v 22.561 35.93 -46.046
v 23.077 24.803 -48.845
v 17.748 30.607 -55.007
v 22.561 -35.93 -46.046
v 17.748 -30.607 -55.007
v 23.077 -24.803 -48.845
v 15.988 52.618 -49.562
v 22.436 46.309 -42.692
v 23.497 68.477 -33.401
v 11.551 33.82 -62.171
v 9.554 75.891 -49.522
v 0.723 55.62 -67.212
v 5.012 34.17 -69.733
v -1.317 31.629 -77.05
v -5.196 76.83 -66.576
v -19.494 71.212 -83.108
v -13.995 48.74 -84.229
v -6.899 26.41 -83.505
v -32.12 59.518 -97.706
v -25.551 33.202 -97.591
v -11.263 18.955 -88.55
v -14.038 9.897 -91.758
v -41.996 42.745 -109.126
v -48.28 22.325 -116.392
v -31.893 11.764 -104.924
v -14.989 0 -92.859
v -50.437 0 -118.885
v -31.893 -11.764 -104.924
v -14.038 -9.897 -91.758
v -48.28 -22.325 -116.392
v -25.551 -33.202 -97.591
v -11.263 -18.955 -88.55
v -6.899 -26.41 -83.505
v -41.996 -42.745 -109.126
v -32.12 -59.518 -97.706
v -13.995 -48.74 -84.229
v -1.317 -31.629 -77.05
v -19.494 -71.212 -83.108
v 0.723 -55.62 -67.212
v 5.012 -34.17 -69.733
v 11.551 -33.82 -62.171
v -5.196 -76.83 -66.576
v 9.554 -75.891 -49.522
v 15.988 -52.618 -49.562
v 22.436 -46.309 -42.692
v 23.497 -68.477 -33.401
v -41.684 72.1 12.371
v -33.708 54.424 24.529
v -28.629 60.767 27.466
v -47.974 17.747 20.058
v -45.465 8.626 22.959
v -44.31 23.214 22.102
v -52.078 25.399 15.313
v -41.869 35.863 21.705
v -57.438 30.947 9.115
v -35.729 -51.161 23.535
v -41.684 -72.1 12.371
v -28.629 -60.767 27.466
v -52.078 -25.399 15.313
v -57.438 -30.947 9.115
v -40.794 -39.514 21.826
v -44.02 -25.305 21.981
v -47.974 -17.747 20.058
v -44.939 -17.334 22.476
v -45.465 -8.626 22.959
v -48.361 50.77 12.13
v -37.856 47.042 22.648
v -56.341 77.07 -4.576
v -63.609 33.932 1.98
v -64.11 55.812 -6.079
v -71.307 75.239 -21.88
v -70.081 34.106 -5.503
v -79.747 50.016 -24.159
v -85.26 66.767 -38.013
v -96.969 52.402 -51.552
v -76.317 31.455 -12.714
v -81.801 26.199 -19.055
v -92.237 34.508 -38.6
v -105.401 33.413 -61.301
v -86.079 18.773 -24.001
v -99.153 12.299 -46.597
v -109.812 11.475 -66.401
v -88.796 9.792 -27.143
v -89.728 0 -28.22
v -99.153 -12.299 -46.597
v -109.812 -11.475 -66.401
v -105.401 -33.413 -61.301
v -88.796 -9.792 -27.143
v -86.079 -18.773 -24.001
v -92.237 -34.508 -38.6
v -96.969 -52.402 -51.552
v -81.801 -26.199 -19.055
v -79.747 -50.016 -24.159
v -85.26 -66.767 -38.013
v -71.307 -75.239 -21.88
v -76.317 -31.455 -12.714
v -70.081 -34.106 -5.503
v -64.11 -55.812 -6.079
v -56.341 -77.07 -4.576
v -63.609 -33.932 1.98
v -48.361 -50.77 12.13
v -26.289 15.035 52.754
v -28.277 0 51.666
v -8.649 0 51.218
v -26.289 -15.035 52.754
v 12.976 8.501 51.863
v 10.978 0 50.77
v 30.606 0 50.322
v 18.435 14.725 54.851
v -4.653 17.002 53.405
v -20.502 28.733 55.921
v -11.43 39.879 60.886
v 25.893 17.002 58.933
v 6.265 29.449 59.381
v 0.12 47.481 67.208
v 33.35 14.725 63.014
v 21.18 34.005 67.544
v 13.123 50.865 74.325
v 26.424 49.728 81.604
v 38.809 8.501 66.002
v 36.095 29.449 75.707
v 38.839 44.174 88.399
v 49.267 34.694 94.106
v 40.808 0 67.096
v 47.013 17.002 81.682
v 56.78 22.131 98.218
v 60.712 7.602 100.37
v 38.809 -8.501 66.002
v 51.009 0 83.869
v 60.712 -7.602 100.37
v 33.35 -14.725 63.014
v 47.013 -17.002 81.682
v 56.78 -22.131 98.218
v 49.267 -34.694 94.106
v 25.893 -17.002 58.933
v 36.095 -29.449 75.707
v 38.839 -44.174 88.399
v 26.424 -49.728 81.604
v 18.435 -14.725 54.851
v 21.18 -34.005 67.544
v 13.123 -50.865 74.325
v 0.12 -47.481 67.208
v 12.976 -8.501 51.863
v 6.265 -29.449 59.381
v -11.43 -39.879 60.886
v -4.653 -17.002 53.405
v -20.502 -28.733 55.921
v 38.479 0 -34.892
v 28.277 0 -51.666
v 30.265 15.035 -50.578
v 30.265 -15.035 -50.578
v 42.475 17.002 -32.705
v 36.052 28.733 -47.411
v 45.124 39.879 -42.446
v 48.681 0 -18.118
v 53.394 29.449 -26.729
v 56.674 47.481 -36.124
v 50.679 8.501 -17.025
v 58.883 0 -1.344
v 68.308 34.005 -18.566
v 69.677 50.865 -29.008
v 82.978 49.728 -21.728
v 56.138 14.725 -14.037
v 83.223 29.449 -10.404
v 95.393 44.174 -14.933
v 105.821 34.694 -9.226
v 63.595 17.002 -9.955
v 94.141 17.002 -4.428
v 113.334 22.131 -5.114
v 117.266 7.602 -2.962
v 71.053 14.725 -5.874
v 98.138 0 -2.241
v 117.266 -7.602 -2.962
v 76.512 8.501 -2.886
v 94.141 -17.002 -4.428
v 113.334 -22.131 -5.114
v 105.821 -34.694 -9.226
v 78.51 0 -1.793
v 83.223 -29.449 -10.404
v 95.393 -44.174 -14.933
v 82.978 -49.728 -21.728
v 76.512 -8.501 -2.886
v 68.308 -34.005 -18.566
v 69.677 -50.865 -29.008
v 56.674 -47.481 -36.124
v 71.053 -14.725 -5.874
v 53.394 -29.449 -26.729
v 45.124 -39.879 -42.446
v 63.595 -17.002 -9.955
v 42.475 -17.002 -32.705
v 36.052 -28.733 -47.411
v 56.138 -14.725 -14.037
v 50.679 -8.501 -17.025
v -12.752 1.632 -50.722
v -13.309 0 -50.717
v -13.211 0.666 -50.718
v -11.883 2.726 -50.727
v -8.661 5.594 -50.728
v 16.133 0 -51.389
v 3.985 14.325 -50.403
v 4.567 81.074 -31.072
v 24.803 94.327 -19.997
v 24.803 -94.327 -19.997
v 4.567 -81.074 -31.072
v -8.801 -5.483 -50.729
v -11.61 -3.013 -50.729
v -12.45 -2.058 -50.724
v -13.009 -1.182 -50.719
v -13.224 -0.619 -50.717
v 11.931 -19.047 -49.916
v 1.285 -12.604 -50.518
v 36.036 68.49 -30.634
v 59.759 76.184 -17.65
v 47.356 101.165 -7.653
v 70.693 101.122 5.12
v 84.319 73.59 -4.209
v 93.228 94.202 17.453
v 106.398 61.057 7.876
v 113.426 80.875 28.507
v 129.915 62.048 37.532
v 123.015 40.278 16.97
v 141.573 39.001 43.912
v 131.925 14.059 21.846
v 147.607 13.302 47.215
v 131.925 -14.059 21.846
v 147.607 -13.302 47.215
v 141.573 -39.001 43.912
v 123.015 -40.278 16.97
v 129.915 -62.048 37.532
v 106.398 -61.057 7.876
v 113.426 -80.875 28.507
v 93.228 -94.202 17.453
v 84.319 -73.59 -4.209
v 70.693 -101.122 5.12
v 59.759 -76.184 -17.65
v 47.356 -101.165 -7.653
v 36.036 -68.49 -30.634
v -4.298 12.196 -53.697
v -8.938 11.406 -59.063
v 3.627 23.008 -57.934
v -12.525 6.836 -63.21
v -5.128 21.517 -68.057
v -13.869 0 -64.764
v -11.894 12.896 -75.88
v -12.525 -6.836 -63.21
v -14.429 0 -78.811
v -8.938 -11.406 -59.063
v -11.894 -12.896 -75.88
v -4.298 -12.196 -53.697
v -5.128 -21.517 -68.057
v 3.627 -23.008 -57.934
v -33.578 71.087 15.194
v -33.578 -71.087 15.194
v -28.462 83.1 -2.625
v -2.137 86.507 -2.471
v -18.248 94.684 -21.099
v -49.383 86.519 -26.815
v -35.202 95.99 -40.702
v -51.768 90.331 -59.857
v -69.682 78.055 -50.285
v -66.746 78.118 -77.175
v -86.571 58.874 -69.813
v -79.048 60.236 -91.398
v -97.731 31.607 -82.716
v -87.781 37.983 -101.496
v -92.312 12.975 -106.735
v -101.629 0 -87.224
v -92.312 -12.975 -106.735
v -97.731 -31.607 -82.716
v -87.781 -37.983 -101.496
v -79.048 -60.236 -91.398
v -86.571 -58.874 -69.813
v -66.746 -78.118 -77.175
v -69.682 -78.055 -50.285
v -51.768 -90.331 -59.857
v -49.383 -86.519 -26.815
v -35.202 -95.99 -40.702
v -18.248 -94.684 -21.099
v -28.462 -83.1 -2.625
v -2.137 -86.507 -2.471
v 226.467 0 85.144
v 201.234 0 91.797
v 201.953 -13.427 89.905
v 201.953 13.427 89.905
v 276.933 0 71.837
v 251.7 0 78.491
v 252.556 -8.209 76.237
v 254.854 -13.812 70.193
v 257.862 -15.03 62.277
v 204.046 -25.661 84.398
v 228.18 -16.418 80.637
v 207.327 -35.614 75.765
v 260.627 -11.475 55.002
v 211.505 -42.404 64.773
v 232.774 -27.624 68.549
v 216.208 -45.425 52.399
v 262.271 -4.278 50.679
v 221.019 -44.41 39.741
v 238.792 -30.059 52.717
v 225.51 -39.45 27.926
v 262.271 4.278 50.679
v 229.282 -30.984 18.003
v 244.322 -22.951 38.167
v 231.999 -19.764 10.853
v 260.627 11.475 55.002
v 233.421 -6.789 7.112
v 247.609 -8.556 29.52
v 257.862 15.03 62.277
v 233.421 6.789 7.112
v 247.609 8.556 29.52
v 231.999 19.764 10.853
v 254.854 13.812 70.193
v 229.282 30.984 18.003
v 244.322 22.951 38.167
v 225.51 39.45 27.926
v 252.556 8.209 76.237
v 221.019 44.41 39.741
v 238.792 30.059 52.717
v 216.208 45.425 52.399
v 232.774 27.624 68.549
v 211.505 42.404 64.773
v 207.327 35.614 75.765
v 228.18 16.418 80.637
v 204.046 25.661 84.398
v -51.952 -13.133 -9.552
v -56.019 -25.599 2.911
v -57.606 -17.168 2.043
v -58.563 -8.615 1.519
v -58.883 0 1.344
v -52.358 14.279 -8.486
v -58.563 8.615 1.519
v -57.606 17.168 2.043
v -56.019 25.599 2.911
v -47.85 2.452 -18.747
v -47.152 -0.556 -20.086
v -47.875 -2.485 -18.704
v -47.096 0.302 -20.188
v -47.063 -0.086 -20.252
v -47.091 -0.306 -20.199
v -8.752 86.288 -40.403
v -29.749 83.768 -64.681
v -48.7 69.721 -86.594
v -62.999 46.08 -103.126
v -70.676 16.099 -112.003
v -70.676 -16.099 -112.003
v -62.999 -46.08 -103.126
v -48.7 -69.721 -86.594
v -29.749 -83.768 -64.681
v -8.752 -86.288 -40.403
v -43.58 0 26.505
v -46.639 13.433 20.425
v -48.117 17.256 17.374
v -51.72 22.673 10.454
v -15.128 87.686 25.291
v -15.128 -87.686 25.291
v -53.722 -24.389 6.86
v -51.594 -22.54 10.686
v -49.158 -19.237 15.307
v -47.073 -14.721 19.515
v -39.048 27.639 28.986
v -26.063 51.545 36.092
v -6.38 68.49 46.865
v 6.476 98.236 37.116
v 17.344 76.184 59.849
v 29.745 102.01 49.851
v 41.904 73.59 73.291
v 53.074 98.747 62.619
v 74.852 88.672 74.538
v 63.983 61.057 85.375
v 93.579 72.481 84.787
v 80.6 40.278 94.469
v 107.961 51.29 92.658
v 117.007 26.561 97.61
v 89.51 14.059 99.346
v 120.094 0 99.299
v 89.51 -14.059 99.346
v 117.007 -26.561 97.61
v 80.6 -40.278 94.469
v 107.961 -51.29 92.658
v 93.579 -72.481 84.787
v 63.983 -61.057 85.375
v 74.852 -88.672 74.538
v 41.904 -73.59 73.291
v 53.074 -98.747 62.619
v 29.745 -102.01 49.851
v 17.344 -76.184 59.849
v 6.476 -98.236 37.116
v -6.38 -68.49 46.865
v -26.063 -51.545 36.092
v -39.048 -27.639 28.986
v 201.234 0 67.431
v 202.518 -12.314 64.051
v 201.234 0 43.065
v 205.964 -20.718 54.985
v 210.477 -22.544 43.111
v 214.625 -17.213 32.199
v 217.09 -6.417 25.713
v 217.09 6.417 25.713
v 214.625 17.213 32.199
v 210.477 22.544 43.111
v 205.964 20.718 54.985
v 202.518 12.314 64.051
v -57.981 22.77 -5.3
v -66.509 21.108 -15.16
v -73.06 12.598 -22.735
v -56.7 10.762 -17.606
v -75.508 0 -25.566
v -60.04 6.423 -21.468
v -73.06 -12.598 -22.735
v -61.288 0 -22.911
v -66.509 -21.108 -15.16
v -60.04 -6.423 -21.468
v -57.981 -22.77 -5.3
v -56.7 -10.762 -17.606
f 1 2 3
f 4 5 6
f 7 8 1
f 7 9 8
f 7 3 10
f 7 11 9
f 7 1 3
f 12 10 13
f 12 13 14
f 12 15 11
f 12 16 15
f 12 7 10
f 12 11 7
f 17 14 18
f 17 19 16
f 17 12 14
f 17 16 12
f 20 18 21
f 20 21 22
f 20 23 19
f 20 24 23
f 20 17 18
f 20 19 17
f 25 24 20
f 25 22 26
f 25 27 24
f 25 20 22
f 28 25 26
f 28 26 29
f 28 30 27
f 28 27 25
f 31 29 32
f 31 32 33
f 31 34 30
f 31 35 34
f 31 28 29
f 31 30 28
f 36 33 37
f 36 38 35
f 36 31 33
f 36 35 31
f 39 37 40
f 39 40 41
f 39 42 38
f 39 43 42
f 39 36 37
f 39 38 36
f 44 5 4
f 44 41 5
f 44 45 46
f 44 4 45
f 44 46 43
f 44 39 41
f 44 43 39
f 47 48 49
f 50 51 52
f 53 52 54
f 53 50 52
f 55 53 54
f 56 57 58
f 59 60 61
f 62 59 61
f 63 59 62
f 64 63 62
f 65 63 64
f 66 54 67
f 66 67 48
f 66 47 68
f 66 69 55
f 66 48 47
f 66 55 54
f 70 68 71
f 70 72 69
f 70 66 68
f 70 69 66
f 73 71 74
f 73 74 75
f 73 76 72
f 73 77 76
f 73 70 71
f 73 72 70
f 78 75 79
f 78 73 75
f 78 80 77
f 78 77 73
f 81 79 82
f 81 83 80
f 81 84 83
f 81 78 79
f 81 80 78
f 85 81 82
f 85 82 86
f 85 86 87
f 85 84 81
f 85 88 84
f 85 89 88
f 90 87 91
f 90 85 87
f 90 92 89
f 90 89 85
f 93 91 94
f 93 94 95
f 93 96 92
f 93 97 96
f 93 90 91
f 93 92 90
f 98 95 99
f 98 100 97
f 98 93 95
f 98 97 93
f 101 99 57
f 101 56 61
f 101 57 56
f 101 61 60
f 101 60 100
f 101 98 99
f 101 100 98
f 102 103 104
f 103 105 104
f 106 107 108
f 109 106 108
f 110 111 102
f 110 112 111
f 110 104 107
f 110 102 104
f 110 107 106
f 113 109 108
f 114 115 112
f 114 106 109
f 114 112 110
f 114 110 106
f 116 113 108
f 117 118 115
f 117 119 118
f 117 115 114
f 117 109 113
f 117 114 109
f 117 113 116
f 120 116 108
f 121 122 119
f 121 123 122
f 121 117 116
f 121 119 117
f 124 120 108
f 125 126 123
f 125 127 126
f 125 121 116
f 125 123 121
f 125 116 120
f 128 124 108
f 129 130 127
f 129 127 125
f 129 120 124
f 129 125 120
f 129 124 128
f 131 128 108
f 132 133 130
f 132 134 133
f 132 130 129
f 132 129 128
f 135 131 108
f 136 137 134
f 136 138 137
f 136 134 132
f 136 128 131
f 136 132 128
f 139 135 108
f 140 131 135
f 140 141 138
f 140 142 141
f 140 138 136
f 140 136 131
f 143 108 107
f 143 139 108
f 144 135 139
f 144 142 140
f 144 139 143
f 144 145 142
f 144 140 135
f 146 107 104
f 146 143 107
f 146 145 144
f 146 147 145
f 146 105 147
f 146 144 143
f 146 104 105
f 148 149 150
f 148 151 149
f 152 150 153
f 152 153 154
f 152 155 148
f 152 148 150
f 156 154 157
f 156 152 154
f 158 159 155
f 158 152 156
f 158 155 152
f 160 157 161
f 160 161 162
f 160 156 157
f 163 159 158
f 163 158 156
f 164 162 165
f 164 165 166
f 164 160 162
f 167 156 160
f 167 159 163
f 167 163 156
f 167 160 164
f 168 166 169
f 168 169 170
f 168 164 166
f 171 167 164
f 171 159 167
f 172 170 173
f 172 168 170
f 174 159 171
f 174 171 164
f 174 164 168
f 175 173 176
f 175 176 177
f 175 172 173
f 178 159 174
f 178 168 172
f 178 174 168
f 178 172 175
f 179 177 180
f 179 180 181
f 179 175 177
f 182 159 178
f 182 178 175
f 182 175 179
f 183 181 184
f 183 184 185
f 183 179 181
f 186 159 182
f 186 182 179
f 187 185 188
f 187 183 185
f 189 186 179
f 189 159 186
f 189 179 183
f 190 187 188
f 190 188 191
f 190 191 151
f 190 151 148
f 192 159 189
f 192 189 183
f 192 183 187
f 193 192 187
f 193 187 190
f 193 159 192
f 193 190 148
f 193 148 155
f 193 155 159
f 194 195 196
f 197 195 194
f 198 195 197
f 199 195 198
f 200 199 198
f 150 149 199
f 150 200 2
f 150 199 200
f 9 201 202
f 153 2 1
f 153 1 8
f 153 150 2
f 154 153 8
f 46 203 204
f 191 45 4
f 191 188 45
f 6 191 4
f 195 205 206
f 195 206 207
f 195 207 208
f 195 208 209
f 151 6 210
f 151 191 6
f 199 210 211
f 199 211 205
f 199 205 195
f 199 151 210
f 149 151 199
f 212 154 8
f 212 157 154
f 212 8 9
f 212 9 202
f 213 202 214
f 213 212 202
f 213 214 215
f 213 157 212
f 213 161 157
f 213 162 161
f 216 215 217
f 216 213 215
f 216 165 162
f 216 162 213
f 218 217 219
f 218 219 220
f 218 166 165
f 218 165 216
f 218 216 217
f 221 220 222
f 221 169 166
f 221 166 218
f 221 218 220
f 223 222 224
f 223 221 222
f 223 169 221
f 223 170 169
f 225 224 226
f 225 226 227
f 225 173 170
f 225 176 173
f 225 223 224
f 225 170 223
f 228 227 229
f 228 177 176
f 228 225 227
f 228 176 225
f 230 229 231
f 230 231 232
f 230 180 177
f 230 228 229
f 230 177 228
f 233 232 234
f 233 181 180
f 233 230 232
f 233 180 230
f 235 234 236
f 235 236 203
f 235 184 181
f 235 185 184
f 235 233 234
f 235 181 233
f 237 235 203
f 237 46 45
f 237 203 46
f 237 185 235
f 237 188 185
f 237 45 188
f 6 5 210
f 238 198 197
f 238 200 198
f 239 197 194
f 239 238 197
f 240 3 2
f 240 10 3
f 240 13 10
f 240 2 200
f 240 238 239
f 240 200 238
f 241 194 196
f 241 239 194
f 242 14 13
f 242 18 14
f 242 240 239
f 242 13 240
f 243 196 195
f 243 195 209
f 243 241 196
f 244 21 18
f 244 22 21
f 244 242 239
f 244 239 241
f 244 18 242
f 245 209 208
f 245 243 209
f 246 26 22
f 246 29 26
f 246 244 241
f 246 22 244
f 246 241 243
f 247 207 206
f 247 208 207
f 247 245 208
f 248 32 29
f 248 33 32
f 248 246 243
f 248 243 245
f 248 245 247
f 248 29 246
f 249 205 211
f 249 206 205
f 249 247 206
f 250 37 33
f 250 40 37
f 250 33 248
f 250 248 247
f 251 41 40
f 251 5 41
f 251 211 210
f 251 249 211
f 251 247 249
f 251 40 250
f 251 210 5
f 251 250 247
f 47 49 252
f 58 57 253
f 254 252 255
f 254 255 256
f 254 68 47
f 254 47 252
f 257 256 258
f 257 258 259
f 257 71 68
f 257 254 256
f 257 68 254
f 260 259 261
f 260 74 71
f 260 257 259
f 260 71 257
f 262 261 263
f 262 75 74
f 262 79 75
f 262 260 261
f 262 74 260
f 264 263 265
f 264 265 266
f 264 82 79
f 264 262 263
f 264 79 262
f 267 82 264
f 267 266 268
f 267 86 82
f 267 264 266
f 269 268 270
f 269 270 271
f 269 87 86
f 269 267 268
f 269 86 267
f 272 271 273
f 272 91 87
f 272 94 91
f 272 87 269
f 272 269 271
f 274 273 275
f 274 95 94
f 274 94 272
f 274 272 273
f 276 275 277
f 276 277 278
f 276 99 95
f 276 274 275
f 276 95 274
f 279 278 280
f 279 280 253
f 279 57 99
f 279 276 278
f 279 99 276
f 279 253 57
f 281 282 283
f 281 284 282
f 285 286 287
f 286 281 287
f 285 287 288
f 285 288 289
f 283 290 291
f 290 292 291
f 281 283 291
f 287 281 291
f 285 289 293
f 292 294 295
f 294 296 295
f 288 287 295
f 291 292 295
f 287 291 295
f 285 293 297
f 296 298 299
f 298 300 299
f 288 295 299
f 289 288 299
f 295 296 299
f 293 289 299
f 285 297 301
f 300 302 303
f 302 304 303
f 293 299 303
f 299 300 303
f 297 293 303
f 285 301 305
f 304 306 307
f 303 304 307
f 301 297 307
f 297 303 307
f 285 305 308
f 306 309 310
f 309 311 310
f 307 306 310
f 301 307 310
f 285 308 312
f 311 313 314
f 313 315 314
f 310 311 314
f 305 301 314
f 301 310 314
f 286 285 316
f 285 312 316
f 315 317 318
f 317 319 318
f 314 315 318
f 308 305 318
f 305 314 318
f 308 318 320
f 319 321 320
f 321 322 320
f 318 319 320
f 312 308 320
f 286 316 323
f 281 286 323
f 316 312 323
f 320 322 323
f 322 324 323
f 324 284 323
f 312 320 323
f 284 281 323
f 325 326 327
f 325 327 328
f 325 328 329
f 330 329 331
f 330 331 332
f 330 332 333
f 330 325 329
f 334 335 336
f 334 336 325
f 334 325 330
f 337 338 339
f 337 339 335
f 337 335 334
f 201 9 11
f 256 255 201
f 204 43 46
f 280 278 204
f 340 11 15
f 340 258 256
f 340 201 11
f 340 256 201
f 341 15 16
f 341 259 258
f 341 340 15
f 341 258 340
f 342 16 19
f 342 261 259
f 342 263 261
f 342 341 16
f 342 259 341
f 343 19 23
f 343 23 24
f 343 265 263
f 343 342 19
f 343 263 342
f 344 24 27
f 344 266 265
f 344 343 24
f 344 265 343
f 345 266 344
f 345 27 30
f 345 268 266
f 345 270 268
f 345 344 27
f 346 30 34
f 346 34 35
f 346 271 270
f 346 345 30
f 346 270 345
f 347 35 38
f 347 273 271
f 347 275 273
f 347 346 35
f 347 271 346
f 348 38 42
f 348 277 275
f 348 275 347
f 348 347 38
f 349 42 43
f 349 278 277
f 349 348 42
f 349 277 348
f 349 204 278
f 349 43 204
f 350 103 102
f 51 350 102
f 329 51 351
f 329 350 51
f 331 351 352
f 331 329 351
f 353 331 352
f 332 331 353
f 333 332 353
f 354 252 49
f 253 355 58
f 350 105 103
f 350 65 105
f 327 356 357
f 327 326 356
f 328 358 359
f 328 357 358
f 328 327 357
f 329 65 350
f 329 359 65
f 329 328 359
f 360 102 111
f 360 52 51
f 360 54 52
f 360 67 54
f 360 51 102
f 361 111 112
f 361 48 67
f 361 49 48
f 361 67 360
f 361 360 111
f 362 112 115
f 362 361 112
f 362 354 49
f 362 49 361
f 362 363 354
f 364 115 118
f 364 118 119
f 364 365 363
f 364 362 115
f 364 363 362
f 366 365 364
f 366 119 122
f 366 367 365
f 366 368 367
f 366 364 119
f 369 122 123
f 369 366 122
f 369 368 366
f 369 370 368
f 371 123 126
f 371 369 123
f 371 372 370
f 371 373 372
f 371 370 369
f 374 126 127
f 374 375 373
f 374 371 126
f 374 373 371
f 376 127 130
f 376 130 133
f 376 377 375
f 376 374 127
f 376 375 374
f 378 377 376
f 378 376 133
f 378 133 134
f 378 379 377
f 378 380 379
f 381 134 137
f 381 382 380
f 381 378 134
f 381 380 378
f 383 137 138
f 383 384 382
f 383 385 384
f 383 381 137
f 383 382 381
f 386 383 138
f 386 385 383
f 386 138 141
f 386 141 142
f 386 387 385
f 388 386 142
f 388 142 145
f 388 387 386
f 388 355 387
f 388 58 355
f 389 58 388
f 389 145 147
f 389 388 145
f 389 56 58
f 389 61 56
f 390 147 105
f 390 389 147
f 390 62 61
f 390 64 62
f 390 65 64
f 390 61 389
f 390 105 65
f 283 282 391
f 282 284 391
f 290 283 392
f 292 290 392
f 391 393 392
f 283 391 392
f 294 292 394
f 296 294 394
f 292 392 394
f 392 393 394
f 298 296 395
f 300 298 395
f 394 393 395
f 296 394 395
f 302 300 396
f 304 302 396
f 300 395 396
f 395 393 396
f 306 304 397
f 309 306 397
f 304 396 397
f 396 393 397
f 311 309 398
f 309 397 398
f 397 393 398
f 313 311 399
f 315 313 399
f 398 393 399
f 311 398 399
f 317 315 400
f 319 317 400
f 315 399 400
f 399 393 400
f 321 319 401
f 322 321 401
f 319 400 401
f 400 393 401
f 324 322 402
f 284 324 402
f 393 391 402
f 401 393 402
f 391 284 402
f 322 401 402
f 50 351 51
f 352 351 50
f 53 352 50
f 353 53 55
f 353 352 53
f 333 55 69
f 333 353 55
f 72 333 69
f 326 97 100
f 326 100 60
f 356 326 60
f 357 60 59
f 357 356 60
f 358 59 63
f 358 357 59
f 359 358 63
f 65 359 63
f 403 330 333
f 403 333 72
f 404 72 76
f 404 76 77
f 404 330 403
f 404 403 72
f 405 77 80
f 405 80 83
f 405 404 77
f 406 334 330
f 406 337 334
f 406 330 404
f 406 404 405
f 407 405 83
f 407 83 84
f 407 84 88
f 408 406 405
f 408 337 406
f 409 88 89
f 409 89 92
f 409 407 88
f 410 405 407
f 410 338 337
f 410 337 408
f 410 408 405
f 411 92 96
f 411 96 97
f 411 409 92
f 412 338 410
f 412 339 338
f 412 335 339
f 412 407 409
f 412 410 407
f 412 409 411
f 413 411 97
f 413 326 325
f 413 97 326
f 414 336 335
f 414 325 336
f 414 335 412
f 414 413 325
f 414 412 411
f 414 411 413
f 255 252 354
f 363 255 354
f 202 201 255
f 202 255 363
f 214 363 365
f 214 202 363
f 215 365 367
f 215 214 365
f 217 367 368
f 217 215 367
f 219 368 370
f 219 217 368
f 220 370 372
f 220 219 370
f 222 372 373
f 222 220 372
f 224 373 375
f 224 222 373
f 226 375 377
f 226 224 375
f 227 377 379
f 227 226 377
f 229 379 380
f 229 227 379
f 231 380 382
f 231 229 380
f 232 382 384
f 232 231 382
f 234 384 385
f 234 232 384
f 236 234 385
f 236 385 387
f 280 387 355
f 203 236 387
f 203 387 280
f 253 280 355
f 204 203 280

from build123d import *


with BuildPart() as f1:
    # F0 (on Front) → F1 (revolve)
    with BuildSketch(Plane.XZ):
        Polygon((58.8826555872, -1.3444429754), (30.6056495642, 50.3216540931), (-28.277006023, 51.6660970685), (-58.8826555872, 1.3444429754), (-30.6056495642, -50.3216540931), (28.277006023, -51.6660970685), align=None)
    revolve(axis=Axis((44.7441525757, 0, 24.4886055589), (0.4801012767, 0, -0.8772130665)))

    # F2 (on Front) → F3 (revolve)
    with BuildSketch(Plane.XZ):
        Polygon((50.6368376685, -2.0196924611), (33.1506110357, 38.3302162095), (-9.2987018562, 49.8166902804), (-44.7459025915, 23.7901804949), (-46.4985260253, -20.1508204345), (-13.2368109649, -48.9178425749), (29.9924927337, -40.8487315143), align=None)
    revolve(axis=Axis((-29.8676684951, 0, -34.5343315047), (-0.7563616711, 0, 0.6541536689)))


with BuildPart() as f5:
    # F4 (on Front) → F5 (revolve)
    with BuildSketch(Plane.XZ):
        Polygon((276.9330739975, 71.8373954296), (201.2336850166, 91.7969271541), (201.2336850166, 43.0651083589), align=None)
    revolve(axis=Axis((239.0833795071, 0, 57.4512518942), (0.9347568472, 0, 0.3552881035)))


solid = Compound([f1.part, f5.part])
